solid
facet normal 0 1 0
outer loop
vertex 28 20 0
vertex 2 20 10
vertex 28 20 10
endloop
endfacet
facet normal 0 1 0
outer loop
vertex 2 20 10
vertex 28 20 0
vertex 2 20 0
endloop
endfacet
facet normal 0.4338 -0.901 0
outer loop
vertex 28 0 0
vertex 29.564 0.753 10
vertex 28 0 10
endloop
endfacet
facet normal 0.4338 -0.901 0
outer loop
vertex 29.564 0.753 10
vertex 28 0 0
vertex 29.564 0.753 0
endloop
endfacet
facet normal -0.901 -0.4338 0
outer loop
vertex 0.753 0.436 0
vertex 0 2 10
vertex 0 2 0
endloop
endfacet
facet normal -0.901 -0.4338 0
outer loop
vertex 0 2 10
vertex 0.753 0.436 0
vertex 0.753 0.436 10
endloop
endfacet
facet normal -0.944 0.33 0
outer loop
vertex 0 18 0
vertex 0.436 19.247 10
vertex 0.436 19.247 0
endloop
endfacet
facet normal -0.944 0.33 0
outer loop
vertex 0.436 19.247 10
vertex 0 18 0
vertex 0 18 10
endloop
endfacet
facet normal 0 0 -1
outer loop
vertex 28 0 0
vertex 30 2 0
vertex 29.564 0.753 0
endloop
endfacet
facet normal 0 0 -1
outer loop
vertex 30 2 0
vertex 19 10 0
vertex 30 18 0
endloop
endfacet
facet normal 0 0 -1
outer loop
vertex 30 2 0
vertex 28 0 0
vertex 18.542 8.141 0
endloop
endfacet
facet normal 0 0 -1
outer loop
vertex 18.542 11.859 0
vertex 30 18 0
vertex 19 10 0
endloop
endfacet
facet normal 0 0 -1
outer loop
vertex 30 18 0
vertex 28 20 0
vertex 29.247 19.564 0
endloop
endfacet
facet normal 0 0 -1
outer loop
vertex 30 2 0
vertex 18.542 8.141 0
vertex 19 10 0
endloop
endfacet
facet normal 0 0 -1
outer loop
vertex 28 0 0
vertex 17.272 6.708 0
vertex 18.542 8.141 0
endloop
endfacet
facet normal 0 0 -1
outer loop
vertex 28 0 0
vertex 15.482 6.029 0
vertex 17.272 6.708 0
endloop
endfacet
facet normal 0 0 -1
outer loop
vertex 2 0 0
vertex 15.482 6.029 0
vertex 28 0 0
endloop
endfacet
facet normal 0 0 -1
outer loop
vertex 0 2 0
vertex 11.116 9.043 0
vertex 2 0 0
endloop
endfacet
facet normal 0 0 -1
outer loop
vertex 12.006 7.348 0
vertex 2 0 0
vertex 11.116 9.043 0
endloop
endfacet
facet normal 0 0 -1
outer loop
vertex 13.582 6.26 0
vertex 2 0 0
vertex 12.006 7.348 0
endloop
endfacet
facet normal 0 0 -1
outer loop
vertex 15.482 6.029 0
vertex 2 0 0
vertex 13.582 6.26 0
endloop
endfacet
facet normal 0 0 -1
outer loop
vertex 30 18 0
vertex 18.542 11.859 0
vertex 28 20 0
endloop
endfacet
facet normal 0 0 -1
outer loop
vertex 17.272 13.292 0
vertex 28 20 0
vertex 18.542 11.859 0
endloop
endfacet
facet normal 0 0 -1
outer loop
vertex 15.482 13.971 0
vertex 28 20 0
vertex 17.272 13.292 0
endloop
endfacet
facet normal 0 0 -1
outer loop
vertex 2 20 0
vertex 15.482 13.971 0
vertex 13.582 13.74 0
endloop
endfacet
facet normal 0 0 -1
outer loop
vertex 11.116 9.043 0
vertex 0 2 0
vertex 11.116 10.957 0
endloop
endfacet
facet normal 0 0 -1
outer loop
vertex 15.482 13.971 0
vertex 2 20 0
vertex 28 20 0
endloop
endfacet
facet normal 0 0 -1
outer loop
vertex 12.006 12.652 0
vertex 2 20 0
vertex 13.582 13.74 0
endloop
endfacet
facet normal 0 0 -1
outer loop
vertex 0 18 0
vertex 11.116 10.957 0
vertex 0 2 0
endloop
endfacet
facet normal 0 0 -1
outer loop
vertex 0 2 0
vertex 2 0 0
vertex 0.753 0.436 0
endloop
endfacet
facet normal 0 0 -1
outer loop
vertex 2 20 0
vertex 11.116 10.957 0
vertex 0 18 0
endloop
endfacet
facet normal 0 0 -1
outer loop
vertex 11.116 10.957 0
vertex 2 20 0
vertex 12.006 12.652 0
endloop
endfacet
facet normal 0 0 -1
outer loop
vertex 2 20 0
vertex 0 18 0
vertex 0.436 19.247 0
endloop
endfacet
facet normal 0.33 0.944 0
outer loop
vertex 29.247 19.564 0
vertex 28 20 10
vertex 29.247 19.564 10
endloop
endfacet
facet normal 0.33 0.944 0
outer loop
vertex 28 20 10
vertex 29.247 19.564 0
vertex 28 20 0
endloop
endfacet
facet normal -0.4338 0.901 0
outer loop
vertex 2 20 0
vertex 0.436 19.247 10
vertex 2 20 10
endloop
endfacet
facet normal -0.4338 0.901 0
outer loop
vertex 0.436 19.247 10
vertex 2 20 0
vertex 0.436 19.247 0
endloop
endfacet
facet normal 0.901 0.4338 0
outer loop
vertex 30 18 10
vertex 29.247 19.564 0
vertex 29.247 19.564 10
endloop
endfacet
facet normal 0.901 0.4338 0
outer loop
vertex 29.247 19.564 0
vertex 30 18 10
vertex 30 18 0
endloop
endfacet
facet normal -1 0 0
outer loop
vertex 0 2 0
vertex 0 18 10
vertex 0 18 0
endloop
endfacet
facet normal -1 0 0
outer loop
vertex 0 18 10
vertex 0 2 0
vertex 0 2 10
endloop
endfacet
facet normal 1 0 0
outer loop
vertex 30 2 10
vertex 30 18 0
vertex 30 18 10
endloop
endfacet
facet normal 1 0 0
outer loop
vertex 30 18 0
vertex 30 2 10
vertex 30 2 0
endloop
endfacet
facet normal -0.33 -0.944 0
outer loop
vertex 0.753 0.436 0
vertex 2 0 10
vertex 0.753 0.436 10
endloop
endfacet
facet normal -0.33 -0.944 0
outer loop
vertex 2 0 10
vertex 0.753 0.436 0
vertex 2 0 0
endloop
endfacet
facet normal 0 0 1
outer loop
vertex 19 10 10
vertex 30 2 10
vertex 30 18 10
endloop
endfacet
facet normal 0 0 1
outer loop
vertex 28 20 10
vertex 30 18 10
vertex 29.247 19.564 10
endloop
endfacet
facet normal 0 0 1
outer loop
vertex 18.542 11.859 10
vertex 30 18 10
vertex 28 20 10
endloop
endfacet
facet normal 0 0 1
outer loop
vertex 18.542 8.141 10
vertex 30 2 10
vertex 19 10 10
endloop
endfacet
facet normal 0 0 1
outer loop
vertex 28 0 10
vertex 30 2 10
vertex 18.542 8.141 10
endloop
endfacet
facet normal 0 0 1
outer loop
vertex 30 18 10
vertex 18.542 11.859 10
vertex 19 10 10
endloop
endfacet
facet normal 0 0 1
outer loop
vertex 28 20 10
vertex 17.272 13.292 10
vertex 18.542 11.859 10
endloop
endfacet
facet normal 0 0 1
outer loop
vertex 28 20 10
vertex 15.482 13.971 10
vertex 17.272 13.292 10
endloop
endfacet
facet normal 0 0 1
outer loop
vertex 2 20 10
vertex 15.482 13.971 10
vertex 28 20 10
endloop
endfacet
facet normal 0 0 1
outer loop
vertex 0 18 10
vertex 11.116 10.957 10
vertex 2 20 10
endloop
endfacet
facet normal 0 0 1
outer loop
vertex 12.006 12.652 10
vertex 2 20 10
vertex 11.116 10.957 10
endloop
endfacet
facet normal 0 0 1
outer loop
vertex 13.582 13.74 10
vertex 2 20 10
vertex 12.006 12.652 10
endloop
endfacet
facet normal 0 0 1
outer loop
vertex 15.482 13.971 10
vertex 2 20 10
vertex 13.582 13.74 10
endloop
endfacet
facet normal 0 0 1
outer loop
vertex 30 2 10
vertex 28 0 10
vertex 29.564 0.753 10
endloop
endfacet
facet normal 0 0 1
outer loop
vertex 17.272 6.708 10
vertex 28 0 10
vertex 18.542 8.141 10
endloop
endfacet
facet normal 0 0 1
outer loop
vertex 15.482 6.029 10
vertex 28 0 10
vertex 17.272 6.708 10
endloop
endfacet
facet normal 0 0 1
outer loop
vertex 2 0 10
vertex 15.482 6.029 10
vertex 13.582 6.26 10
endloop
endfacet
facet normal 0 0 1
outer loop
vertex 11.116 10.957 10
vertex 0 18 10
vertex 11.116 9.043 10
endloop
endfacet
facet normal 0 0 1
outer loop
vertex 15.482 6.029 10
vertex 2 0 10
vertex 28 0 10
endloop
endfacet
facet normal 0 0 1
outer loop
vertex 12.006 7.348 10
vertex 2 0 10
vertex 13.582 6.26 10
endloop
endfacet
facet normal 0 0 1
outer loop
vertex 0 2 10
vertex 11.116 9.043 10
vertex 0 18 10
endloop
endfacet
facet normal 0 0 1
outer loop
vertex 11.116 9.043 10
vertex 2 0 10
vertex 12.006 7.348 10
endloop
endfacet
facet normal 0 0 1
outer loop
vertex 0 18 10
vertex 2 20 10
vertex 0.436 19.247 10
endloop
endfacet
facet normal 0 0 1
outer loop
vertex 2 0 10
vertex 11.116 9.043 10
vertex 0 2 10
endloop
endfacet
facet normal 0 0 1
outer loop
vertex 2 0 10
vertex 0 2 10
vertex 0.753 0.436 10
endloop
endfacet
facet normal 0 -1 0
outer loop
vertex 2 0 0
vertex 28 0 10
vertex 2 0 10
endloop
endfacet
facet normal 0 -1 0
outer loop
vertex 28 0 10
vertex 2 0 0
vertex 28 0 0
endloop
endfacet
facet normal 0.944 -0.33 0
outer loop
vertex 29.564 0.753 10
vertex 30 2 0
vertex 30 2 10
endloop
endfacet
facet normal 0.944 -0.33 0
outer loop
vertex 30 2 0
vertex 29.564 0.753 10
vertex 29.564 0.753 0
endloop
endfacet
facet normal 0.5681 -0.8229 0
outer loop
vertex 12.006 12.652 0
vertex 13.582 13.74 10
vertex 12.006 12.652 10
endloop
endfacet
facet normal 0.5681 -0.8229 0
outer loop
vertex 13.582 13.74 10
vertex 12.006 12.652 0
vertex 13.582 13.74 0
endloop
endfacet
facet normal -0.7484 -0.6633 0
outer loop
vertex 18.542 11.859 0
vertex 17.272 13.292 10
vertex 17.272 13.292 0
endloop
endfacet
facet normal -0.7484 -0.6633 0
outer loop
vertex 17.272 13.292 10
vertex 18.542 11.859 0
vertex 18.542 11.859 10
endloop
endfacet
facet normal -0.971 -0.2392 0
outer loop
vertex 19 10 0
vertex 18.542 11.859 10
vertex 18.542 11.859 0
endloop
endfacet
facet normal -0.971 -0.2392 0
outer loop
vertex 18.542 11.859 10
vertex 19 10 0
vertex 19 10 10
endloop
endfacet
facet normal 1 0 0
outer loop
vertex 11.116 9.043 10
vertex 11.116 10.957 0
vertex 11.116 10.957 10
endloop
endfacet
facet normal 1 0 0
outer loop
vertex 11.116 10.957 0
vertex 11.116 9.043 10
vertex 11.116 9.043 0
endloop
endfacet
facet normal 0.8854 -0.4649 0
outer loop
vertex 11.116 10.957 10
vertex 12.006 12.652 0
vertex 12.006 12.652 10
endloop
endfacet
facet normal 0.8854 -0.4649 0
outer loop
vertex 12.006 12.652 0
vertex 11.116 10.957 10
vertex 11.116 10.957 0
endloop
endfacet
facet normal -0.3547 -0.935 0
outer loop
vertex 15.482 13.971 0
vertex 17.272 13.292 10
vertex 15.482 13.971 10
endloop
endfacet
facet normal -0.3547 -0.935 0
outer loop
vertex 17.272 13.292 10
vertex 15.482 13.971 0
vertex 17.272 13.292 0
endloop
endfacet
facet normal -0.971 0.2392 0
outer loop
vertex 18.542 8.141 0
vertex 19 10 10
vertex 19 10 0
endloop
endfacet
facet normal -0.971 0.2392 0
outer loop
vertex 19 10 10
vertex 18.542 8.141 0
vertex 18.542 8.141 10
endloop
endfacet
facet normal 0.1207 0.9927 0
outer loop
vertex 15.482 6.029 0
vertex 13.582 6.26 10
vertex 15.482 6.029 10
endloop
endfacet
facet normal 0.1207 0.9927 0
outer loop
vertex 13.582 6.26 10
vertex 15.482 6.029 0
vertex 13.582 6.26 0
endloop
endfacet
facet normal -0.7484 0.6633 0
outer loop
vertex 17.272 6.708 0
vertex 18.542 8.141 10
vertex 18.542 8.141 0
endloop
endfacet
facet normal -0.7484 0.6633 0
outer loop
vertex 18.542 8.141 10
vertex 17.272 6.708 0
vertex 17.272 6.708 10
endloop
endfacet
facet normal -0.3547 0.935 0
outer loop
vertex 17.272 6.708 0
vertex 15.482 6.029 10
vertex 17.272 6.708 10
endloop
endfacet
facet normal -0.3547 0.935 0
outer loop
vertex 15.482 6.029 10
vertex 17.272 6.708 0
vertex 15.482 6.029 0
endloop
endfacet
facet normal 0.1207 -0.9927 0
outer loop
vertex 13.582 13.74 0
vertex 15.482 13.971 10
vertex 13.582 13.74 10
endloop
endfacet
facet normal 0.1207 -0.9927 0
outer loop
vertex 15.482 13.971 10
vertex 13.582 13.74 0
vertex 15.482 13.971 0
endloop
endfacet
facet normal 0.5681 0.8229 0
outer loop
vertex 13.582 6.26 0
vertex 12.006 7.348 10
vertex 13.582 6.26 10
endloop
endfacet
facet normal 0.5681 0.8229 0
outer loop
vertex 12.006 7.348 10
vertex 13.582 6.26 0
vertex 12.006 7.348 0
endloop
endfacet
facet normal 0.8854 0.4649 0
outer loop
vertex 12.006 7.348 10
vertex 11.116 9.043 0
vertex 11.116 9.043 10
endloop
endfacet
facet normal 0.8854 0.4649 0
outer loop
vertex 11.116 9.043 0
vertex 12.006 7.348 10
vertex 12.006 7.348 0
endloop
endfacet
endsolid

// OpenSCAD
// Stage 2 of docs/audits/exact-geometry-rust.md: extrusions.
// A plate with rounded corners (offset(r) after offset(delta)) and a drilled hole.
// volume: 5463.008881569225
difference() {
  linear_extrude(10) offset(r=2) offset(delta=-2) square([30, 20]);
  translate([15, 10, -1]) cylinder(r=4, h=12);
}
